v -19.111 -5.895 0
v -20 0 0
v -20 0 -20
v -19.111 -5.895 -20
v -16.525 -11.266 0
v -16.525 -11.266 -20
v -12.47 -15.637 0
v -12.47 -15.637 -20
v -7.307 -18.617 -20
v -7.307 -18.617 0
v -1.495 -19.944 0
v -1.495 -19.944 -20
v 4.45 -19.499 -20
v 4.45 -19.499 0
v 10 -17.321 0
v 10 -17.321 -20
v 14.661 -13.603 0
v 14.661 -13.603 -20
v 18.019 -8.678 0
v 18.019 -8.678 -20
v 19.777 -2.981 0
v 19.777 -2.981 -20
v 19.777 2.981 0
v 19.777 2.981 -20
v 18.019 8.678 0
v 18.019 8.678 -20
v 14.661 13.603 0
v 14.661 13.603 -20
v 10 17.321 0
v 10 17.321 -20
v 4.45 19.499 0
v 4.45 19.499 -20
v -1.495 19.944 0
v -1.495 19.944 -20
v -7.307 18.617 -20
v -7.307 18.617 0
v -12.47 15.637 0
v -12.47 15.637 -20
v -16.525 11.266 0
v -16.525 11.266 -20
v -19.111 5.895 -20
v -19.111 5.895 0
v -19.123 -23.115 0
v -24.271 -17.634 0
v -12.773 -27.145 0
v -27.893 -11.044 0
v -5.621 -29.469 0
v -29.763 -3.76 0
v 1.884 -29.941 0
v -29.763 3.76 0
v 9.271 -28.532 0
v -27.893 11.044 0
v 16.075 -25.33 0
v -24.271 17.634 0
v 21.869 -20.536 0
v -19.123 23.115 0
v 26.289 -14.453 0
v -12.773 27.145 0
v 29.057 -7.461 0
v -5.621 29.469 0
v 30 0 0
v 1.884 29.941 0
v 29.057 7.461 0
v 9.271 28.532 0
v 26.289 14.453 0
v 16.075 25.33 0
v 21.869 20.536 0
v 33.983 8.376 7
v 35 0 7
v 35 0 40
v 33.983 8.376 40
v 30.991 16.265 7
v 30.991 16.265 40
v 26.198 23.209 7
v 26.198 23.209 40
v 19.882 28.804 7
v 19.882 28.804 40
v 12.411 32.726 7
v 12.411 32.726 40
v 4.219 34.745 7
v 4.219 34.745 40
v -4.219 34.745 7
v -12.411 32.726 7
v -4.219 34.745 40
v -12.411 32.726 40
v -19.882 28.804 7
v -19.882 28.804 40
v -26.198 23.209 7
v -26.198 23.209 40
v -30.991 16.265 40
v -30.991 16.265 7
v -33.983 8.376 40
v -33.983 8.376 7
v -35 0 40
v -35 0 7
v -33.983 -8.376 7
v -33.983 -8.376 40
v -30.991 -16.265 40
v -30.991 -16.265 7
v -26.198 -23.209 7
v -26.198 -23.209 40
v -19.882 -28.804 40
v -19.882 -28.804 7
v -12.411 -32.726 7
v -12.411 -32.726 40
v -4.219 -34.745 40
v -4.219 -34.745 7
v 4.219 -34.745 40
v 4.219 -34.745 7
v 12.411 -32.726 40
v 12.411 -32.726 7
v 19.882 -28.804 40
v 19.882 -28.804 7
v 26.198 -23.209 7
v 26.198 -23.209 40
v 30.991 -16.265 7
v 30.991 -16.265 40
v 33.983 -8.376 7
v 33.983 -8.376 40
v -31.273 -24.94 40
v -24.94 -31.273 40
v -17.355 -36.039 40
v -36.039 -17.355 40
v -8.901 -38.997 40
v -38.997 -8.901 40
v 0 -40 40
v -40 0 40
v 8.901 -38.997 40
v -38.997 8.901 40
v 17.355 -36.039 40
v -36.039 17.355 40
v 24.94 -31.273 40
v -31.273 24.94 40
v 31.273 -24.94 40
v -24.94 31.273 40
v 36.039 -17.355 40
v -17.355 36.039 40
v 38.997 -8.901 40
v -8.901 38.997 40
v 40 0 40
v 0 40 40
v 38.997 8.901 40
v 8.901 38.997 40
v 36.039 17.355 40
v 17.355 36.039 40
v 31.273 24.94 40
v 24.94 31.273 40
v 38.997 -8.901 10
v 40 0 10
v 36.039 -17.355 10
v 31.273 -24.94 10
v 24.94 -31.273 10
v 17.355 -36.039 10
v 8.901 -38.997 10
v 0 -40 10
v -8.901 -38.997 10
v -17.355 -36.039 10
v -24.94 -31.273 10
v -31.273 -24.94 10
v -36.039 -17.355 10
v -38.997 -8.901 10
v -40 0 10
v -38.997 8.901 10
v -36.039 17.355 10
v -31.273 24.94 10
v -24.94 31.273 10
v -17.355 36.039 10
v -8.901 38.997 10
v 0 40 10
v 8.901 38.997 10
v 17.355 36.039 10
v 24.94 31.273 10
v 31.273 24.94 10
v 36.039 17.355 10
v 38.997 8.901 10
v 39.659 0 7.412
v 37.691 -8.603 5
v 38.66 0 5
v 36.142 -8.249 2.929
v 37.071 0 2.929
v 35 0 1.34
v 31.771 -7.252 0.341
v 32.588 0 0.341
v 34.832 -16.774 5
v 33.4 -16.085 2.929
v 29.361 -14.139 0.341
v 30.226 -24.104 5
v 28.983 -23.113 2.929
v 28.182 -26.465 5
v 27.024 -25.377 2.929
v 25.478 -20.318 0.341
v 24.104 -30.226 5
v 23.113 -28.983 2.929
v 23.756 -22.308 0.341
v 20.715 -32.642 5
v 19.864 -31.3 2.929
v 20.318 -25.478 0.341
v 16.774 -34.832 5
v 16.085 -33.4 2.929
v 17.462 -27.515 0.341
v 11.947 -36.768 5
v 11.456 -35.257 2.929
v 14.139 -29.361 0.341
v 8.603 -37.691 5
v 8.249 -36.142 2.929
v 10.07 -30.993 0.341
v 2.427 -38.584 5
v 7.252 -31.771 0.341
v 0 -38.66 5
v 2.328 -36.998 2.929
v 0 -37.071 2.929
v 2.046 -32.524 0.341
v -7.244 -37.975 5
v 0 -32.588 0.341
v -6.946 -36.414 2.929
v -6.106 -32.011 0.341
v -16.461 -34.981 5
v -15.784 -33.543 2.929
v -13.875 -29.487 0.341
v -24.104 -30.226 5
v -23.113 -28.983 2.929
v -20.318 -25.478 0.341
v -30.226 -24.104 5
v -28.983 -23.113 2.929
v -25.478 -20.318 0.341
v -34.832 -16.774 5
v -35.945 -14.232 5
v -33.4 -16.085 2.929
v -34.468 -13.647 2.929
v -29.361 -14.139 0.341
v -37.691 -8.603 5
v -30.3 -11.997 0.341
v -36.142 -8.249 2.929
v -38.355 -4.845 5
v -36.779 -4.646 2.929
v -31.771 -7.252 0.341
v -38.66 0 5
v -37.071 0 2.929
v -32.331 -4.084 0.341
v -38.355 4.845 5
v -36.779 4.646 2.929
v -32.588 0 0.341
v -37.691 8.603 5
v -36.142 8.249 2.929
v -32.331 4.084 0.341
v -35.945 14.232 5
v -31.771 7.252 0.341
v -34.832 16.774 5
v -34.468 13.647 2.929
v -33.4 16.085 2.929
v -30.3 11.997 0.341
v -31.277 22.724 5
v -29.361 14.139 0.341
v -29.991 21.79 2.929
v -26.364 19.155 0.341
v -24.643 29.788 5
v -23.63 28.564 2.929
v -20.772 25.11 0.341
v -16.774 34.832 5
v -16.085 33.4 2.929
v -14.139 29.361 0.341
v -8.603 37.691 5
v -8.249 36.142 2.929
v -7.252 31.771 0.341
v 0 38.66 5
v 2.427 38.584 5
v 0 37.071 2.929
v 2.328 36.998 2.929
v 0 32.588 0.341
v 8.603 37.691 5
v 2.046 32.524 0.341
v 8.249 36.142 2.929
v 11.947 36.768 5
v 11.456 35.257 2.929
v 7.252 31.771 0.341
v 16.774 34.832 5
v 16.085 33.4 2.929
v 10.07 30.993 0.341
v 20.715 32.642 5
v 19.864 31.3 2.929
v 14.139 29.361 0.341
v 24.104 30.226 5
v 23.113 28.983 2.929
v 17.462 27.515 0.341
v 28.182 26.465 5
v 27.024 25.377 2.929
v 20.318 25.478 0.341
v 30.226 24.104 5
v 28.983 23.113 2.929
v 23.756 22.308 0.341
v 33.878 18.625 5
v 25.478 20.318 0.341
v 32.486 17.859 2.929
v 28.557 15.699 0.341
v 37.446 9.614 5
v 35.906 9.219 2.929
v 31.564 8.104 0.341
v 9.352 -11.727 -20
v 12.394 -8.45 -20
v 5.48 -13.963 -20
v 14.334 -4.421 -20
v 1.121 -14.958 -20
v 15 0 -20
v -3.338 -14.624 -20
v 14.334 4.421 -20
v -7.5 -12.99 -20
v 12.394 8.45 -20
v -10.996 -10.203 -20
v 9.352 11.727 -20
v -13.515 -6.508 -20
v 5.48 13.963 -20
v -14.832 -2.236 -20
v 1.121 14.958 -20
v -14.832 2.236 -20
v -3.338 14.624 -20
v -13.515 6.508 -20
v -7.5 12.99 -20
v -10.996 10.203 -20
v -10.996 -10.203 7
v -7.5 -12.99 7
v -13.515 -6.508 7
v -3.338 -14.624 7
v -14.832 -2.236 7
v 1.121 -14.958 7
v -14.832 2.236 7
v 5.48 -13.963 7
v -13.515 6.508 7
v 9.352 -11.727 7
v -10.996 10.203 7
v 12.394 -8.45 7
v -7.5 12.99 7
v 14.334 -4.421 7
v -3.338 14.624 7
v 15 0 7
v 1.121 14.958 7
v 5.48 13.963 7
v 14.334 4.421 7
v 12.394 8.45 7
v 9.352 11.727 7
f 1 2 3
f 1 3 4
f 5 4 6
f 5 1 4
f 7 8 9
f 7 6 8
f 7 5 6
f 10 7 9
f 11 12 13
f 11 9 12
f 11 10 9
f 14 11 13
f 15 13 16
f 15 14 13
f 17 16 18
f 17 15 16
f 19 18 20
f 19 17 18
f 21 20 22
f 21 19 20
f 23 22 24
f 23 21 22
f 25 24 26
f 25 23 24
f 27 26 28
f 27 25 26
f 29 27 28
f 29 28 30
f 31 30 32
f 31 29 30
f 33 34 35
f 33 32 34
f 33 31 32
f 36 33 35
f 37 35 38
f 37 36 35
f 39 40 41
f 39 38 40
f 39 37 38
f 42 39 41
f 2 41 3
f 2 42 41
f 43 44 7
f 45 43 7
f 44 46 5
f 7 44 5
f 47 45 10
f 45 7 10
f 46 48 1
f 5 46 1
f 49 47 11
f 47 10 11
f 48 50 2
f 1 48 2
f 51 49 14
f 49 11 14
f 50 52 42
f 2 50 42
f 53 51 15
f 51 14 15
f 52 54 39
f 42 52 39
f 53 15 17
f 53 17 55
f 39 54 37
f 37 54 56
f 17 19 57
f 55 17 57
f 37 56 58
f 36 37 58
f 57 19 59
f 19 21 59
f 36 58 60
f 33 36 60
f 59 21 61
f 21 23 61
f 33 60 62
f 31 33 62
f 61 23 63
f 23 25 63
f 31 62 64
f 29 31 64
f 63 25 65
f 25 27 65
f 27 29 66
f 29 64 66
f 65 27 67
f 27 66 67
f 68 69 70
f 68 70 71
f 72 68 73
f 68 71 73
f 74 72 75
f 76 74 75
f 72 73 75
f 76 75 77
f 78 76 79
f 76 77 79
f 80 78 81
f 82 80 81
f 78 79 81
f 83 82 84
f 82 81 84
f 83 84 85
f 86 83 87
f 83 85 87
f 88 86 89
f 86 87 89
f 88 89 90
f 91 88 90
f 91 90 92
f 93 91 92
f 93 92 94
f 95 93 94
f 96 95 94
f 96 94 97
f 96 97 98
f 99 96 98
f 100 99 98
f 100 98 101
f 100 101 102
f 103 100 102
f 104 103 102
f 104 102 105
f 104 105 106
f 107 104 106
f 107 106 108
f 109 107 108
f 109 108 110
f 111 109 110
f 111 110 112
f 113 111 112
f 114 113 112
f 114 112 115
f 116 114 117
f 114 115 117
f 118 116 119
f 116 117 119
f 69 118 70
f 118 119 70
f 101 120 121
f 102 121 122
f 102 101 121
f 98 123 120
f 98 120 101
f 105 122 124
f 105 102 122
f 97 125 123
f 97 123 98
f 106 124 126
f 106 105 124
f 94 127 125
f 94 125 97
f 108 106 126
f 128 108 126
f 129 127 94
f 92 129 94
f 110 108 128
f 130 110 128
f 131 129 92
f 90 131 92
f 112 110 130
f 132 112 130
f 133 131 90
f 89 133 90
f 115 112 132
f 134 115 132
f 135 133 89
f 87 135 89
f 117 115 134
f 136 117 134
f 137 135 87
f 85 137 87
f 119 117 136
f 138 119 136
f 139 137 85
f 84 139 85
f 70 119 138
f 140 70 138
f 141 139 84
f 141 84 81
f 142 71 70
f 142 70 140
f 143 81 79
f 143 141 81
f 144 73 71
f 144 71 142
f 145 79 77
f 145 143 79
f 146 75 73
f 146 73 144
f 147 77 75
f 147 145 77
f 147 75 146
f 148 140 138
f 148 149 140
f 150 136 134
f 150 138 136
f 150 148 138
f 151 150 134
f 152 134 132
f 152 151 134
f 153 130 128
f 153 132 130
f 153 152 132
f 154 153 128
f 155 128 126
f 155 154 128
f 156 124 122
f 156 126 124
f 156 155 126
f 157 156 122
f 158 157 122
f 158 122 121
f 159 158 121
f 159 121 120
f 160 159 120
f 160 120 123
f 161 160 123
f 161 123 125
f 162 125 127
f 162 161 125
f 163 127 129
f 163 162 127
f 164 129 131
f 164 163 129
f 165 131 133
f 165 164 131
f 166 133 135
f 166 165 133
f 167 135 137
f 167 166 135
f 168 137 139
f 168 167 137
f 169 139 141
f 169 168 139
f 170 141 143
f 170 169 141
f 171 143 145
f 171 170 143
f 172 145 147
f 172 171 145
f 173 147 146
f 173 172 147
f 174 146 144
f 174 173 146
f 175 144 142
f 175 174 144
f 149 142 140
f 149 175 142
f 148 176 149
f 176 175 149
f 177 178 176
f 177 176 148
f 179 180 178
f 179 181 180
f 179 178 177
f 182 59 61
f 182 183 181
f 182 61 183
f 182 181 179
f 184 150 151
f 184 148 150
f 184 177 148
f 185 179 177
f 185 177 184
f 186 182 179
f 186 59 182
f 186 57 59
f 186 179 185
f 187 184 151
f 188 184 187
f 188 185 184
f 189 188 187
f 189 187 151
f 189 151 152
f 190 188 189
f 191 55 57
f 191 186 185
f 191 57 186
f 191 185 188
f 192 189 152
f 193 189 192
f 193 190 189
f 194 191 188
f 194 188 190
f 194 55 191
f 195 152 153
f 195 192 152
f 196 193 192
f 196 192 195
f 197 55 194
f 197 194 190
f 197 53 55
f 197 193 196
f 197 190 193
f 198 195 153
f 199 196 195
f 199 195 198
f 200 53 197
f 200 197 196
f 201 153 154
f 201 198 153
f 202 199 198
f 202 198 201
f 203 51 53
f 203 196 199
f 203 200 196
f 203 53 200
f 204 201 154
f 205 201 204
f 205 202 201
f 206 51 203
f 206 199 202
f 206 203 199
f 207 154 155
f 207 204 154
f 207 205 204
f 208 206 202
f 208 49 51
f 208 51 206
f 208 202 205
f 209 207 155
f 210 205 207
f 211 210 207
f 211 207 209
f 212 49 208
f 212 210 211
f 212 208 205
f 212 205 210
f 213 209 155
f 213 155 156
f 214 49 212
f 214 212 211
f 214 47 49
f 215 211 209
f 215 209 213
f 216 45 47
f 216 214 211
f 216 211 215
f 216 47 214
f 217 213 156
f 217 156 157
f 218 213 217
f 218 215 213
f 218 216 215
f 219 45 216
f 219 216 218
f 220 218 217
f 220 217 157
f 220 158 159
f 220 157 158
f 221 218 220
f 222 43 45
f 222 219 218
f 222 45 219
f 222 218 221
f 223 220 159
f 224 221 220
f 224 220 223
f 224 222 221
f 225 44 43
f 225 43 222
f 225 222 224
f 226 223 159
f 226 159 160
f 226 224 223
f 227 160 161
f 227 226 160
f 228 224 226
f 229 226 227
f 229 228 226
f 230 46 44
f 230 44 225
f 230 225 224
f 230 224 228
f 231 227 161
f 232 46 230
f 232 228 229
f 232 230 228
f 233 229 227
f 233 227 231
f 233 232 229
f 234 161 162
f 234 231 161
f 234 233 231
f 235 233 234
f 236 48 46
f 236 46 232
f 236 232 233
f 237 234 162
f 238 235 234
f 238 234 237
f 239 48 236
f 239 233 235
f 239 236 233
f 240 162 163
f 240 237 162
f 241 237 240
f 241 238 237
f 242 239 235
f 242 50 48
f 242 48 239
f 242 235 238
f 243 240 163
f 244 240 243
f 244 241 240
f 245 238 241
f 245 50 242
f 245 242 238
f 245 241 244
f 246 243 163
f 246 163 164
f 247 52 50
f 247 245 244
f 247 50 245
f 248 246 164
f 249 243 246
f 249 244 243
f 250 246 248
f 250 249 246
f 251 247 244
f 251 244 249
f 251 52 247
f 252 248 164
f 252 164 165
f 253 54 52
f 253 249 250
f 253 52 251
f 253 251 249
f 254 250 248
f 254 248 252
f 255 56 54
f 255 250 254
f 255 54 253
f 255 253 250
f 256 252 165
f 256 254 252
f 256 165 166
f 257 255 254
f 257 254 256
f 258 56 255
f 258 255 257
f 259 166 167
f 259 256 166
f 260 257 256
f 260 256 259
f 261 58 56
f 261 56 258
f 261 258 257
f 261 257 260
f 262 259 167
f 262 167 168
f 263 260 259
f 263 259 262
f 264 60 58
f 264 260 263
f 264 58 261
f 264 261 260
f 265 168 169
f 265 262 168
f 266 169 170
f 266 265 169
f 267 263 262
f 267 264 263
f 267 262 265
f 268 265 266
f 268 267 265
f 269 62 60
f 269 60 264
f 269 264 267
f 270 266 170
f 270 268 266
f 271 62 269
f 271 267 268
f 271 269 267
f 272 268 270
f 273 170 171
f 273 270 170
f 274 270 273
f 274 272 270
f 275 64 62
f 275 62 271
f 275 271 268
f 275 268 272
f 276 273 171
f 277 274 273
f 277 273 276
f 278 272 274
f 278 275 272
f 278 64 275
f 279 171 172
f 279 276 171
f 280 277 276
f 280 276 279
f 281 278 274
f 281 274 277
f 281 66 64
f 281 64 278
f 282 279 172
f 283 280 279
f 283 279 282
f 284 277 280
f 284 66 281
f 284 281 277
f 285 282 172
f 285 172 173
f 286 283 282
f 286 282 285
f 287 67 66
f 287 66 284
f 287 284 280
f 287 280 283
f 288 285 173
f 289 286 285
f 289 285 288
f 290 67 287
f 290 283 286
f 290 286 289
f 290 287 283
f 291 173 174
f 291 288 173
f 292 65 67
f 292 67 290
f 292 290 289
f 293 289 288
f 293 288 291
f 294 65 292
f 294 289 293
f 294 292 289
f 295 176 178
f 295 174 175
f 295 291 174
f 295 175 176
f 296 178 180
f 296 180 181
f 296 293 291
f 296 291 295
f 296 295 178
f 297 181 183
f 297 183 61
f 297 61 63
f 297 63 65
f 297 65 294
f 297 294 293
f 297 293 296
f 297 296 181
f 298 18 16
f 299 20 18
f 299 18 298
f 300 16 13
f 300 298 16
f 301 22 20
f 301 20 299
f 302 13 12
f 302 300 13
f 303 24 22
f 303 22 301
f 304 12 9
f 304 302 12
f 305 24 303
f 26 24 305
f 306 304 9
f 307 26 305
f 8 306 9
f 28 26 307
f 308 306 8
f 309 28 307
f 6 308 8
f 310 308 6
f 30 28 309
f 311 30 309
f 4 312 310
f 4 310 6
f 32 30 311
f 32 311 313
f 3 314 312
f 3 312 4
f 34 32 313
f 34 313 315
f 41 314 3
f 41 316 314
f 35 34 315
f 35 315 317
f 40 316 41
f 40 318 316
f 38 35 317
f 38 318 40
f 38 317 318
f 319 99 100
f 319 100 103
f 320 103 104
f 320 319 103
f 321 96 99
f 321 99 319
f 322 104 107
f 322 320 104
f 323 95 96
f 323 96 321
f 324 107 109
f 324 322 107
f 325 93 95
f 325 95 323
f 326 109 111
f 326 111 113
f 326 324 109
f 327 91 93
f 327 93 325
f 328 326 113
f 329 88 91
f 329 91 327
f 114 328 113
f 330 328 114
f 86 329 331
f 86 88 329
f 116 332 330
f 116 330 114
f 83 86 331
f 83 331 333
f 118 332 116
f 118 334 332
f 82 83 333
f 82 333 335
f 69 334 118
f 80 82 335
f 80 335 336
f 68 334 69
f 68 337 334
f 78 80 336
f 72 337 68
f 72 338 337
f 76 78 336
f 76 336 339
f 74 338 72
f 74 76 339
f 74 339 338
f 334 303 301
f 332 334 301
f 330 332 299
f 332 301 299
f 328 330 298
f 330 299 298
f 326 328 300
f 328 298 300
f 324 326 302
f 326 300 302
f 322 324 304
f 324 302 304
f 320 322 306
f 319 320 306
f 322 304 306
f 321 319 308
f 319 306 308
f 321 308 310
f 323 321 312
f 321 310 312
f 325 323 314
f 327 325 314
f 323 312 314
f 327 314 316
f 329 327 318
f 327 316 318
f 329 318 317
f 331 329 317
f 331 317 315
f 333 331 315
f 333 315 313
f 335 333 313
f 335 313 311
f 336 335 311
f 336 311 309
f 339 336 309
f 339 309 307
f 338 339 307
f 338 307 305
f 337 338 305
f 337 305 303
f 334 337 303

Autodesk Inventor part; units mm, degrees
ref_plane "YZ Plane" through (0, 0, 0) normal (1, 0, 0) x (0, 1, 0)
ref_plane "XZ Plane" through (0, 0, 0) normal (0, 1, 0) x (-1, 0, 0)
ref_plane "XY Plane" through (0, 0, 0) normal (0, 0, 1) x (1, 0, 0)
sketch "Sketch1" plane through (0, 0, 0) normal (0, 0, 1) x (1, 0, 0)
  circle A0 centre (0, 0) radius 40
  circle A1 centre (0, 0) radius 15
  dimension "d0" = 80
  dimension "d1" = 30
extrude "Extrusion1" add sketch "Sketch1" along normal blind 40
sketch "Sketch2" plane through (0, 0, 0) normal (0, 0, -1) x (-1, 0, 0)
  circle A0 centre (0, 0) radius 20
  dimension "d4" = 40
extrude "Extrusion2" add sketch "Sketch2" along normal blind 20
extrude "Extrusion3" cut sketch "Sketch1" against normal blind 20 contours A1
fillet "Fillet1" radius 10 1 edges at (-40, 0, 0)
sketch "Sketch3" plane through (0, 0, 40) normal (0, 0, 1) x (1, 0, 0)
  circle A0 centre (0, 0) radius 35
  dimension "d10" = 70
extrude "Extrusion4" cut sketch "Sketch3" against normal blind 33
properties part number "output"
